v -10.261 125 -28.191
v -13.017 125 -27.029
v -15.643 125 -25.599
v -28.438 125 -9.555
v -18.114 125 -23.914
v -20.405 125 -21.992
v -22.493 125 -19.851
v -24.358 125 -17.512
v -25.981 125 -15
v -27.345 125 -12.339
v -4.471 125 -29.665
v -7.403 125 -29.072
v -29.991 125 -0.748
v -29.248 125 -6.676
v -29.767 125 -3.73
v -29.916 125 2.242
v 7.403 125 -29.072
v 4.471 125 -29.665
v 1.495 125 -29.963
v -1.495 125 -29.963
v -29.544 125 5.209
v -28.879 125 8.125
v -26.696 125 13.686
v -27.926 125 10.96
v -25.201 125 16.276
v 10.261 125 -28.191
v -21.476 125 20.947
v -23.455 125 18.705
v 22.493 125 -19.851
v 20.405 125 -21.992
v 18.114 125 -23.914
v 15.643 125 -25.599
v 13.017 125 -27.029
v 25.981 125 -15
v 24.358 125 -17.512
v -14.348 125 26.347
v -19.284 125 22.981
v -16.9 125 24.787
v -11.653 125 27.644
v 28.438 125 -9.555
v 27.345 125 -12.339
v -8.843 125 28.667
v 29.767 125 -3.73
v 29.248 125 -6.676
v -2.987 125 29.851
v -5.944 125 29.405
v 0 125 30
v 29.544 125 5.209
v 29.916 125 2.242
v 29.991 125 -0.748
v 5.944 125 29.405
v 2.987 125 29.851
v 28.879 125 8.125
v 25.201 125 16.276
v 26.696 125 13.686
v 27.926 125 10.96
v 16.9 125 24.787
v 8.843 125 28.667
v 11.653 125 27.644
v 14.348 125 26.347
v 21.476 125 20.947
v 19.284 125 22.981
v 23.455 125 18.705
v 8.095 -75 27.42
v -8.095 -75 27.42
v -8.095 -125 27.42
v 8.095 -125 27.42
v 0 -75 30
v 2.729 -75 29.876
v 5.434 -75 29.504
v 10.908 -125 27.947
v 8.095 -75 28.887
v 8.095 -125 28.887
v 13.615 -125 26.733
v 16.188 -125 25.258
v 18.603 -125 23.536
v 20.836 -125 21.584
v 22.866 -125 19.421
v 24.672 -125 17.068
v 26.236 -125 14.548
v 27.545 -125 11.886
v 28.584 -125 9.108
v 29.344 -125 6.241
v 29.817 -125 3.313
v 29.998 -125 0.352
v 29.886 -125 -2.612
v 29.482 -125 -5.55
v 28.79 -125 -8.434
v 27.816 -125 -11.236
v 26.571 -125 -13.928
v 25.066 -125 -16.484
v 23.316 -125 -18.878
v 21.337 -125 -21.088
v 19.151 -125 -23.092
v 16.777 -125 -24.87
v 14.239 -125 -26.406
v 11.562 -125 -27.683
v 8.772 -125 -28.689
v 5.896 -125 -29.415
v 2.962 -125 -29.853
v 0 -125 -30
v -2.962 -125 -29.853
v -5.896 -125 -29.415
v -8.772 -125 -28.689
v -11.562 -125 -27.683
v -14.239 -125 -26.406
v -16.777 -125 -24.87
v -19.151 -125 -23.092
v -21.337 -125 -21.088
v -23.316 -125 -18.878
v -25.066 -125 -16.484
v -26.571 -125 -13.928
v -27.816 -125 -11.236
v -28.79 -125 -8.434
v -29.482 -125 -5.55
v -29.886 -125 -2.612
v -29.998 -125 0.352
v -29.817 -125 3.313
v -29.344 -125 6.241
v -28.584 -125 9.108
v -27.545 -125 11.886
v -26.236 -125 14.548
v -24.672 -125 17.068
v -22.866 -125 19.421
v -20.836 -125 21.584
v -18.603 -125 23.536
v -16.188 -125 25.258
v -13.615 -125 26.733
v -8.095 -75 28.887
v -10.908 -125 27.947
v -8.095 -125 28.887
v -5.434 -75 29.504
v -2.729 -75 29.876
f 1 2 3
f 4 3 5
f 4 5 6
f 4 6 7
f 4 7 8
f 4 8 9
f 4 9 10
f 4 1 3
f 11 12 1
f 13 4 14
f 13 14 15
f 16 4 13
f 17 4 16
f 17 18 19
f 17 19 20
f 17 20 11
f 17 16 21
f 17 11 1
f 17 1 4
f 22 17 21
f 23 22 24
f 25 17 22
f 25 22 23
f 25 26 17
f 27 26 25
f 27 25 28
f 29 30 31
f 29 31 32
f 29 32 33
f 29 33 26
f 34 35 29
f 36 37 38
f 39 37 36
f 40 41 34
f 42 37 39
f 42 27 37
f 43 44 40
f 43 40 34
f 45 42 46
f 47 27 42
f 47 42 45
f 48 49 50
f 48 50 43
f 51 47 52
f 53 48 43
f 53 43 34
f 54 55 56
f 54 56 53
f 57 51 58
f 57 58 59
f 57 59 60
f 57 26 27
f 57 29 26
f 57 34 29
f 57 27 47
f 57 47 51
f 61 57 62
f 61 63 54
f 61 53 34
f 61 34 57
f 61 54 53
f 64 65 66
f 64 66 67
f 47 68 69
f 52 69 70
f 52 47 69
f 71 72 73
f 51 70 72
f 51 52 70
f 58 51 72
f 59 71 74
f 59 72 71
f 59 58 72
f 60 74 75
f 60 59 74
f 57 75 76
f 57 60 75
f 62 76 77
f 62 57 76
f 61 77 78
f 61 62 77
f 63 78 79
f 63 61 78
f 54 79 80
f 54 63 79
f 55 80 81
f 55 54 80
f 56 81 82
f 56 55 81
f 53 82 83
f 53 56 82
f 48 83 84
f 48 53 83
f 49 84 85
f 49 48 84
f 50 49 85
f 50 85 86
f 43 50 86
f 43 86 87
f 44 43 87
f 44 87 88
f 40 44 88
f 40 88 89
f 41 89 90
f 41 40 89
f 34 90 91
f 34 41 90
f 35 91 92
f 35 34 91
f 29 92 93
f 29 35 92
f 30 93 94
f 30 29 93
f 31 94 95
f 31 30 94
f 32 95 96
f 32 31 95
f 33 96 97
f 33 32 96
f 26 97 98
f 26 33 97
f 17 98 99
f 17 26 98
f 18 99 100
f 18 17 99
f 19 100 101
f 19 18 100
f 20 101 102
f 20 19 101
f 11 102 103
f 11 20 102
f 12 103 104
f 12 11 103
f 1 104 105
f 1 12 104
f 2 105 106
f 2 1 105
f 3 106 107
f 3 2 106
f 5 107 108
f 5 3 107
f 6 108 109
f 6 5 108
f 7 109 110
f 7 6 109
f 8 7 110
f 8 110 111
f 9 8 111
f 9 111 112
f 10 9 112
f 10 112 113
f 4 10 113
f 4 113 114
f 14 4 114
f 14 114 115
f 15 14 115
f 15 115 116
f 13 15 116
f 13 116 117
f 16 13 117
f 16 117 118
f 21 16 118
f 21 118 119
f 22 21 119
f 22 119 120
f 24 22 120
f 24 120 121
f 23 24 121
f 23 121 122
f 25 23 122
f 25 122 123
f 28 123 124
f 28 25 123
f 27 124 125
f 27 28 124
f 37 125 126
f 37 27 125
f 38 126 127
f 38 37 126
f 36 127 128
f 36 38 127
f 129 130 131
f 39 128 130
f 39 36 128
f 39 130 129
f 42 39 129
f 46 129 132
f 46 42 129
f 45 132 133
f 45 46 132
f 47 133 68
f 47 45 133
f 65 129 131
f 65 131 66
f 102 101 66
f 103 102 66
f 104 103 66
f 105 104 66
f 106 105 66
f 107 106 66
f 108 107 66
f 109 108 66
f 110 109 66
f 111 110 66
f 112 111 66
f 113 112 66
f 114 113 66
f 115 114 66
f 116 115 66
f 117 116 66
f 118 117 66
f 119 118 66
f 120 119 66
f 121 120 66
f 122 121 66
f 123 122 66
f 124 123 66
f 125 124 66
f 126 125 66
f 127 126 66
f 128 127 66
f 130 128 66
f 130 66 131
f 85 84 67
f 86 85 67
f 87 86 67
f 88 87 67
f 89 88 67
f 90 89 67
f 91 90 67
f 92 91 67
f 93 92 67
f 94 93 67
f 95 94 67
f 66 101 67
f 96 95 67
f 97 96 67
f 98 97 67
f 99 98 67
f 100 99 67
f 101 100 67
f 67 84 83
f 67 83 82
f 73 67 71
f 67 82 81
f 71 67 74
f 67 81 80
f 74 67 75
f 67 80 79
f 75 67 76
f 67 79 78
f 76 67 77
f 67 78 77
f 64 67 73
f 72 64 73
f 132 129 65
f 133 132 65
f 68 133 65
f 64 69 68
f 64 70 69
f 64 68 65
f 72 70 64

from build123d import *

# Parameters (mm, degrees)
SKETCH2_R           = 30
BOSS_EXTRUDE1_DEPTH = 125
CUT_EXTRUDE1_START  = -50
CUT_EXTRUDE1_DEPTH  = 50


with BuildPart() as part:
    # Sketch2 → Boss-Extrude1 (new, symmetric)
    with BuildSketch(Plane(origin=(0, 0, 0), x_dir=(1, 0, 0), z_dir=(0, 1, 0))):
        with Locations(Location((0, 0, 0), (0, 0, 270))):
            Circle(SKETCH2_R)
    extrude(amount=BOSS_EXTRUDE1_DEPTH, both=True)

    # Sketch3 → Cut-Extrude1 (cut)
    with BuildSketch(Plane.XZ.offset(125).offset(CUT_EXTRUDE1_START)):
        with BuildLine():
            ThreePointArc((-8.095335695, 28.887117197), (0, 30), (8.095335695, 28.887117197))
            Line((8.095335695, 28.887117197), (8.095335695, 34.42))
            Line((8.095335695, 34.42), (-8.095335695, 34.42))
            Line((-8.095335695, 34.42), (-8.095335695, 28.887117197))
        make_face()
        with BuildLine():
            Line((-8.095335695, 27.42), (8.095335695, 27.42))
            Line((8.095335695, 27.42), (8.095335695, 28.887117197))
            ThreePointArc((8.095335695, 28.887117197), (0, 30), (-8.095335695, 28.887117197))
            Line((-8.095335695, 28.887117197), (-8.095335695, 27.42))
        make_face()
    extrude(amount=CUT_EXTRUDE1_DEPTH, mode=Mode.SUBTRACT)


solid = part.part
